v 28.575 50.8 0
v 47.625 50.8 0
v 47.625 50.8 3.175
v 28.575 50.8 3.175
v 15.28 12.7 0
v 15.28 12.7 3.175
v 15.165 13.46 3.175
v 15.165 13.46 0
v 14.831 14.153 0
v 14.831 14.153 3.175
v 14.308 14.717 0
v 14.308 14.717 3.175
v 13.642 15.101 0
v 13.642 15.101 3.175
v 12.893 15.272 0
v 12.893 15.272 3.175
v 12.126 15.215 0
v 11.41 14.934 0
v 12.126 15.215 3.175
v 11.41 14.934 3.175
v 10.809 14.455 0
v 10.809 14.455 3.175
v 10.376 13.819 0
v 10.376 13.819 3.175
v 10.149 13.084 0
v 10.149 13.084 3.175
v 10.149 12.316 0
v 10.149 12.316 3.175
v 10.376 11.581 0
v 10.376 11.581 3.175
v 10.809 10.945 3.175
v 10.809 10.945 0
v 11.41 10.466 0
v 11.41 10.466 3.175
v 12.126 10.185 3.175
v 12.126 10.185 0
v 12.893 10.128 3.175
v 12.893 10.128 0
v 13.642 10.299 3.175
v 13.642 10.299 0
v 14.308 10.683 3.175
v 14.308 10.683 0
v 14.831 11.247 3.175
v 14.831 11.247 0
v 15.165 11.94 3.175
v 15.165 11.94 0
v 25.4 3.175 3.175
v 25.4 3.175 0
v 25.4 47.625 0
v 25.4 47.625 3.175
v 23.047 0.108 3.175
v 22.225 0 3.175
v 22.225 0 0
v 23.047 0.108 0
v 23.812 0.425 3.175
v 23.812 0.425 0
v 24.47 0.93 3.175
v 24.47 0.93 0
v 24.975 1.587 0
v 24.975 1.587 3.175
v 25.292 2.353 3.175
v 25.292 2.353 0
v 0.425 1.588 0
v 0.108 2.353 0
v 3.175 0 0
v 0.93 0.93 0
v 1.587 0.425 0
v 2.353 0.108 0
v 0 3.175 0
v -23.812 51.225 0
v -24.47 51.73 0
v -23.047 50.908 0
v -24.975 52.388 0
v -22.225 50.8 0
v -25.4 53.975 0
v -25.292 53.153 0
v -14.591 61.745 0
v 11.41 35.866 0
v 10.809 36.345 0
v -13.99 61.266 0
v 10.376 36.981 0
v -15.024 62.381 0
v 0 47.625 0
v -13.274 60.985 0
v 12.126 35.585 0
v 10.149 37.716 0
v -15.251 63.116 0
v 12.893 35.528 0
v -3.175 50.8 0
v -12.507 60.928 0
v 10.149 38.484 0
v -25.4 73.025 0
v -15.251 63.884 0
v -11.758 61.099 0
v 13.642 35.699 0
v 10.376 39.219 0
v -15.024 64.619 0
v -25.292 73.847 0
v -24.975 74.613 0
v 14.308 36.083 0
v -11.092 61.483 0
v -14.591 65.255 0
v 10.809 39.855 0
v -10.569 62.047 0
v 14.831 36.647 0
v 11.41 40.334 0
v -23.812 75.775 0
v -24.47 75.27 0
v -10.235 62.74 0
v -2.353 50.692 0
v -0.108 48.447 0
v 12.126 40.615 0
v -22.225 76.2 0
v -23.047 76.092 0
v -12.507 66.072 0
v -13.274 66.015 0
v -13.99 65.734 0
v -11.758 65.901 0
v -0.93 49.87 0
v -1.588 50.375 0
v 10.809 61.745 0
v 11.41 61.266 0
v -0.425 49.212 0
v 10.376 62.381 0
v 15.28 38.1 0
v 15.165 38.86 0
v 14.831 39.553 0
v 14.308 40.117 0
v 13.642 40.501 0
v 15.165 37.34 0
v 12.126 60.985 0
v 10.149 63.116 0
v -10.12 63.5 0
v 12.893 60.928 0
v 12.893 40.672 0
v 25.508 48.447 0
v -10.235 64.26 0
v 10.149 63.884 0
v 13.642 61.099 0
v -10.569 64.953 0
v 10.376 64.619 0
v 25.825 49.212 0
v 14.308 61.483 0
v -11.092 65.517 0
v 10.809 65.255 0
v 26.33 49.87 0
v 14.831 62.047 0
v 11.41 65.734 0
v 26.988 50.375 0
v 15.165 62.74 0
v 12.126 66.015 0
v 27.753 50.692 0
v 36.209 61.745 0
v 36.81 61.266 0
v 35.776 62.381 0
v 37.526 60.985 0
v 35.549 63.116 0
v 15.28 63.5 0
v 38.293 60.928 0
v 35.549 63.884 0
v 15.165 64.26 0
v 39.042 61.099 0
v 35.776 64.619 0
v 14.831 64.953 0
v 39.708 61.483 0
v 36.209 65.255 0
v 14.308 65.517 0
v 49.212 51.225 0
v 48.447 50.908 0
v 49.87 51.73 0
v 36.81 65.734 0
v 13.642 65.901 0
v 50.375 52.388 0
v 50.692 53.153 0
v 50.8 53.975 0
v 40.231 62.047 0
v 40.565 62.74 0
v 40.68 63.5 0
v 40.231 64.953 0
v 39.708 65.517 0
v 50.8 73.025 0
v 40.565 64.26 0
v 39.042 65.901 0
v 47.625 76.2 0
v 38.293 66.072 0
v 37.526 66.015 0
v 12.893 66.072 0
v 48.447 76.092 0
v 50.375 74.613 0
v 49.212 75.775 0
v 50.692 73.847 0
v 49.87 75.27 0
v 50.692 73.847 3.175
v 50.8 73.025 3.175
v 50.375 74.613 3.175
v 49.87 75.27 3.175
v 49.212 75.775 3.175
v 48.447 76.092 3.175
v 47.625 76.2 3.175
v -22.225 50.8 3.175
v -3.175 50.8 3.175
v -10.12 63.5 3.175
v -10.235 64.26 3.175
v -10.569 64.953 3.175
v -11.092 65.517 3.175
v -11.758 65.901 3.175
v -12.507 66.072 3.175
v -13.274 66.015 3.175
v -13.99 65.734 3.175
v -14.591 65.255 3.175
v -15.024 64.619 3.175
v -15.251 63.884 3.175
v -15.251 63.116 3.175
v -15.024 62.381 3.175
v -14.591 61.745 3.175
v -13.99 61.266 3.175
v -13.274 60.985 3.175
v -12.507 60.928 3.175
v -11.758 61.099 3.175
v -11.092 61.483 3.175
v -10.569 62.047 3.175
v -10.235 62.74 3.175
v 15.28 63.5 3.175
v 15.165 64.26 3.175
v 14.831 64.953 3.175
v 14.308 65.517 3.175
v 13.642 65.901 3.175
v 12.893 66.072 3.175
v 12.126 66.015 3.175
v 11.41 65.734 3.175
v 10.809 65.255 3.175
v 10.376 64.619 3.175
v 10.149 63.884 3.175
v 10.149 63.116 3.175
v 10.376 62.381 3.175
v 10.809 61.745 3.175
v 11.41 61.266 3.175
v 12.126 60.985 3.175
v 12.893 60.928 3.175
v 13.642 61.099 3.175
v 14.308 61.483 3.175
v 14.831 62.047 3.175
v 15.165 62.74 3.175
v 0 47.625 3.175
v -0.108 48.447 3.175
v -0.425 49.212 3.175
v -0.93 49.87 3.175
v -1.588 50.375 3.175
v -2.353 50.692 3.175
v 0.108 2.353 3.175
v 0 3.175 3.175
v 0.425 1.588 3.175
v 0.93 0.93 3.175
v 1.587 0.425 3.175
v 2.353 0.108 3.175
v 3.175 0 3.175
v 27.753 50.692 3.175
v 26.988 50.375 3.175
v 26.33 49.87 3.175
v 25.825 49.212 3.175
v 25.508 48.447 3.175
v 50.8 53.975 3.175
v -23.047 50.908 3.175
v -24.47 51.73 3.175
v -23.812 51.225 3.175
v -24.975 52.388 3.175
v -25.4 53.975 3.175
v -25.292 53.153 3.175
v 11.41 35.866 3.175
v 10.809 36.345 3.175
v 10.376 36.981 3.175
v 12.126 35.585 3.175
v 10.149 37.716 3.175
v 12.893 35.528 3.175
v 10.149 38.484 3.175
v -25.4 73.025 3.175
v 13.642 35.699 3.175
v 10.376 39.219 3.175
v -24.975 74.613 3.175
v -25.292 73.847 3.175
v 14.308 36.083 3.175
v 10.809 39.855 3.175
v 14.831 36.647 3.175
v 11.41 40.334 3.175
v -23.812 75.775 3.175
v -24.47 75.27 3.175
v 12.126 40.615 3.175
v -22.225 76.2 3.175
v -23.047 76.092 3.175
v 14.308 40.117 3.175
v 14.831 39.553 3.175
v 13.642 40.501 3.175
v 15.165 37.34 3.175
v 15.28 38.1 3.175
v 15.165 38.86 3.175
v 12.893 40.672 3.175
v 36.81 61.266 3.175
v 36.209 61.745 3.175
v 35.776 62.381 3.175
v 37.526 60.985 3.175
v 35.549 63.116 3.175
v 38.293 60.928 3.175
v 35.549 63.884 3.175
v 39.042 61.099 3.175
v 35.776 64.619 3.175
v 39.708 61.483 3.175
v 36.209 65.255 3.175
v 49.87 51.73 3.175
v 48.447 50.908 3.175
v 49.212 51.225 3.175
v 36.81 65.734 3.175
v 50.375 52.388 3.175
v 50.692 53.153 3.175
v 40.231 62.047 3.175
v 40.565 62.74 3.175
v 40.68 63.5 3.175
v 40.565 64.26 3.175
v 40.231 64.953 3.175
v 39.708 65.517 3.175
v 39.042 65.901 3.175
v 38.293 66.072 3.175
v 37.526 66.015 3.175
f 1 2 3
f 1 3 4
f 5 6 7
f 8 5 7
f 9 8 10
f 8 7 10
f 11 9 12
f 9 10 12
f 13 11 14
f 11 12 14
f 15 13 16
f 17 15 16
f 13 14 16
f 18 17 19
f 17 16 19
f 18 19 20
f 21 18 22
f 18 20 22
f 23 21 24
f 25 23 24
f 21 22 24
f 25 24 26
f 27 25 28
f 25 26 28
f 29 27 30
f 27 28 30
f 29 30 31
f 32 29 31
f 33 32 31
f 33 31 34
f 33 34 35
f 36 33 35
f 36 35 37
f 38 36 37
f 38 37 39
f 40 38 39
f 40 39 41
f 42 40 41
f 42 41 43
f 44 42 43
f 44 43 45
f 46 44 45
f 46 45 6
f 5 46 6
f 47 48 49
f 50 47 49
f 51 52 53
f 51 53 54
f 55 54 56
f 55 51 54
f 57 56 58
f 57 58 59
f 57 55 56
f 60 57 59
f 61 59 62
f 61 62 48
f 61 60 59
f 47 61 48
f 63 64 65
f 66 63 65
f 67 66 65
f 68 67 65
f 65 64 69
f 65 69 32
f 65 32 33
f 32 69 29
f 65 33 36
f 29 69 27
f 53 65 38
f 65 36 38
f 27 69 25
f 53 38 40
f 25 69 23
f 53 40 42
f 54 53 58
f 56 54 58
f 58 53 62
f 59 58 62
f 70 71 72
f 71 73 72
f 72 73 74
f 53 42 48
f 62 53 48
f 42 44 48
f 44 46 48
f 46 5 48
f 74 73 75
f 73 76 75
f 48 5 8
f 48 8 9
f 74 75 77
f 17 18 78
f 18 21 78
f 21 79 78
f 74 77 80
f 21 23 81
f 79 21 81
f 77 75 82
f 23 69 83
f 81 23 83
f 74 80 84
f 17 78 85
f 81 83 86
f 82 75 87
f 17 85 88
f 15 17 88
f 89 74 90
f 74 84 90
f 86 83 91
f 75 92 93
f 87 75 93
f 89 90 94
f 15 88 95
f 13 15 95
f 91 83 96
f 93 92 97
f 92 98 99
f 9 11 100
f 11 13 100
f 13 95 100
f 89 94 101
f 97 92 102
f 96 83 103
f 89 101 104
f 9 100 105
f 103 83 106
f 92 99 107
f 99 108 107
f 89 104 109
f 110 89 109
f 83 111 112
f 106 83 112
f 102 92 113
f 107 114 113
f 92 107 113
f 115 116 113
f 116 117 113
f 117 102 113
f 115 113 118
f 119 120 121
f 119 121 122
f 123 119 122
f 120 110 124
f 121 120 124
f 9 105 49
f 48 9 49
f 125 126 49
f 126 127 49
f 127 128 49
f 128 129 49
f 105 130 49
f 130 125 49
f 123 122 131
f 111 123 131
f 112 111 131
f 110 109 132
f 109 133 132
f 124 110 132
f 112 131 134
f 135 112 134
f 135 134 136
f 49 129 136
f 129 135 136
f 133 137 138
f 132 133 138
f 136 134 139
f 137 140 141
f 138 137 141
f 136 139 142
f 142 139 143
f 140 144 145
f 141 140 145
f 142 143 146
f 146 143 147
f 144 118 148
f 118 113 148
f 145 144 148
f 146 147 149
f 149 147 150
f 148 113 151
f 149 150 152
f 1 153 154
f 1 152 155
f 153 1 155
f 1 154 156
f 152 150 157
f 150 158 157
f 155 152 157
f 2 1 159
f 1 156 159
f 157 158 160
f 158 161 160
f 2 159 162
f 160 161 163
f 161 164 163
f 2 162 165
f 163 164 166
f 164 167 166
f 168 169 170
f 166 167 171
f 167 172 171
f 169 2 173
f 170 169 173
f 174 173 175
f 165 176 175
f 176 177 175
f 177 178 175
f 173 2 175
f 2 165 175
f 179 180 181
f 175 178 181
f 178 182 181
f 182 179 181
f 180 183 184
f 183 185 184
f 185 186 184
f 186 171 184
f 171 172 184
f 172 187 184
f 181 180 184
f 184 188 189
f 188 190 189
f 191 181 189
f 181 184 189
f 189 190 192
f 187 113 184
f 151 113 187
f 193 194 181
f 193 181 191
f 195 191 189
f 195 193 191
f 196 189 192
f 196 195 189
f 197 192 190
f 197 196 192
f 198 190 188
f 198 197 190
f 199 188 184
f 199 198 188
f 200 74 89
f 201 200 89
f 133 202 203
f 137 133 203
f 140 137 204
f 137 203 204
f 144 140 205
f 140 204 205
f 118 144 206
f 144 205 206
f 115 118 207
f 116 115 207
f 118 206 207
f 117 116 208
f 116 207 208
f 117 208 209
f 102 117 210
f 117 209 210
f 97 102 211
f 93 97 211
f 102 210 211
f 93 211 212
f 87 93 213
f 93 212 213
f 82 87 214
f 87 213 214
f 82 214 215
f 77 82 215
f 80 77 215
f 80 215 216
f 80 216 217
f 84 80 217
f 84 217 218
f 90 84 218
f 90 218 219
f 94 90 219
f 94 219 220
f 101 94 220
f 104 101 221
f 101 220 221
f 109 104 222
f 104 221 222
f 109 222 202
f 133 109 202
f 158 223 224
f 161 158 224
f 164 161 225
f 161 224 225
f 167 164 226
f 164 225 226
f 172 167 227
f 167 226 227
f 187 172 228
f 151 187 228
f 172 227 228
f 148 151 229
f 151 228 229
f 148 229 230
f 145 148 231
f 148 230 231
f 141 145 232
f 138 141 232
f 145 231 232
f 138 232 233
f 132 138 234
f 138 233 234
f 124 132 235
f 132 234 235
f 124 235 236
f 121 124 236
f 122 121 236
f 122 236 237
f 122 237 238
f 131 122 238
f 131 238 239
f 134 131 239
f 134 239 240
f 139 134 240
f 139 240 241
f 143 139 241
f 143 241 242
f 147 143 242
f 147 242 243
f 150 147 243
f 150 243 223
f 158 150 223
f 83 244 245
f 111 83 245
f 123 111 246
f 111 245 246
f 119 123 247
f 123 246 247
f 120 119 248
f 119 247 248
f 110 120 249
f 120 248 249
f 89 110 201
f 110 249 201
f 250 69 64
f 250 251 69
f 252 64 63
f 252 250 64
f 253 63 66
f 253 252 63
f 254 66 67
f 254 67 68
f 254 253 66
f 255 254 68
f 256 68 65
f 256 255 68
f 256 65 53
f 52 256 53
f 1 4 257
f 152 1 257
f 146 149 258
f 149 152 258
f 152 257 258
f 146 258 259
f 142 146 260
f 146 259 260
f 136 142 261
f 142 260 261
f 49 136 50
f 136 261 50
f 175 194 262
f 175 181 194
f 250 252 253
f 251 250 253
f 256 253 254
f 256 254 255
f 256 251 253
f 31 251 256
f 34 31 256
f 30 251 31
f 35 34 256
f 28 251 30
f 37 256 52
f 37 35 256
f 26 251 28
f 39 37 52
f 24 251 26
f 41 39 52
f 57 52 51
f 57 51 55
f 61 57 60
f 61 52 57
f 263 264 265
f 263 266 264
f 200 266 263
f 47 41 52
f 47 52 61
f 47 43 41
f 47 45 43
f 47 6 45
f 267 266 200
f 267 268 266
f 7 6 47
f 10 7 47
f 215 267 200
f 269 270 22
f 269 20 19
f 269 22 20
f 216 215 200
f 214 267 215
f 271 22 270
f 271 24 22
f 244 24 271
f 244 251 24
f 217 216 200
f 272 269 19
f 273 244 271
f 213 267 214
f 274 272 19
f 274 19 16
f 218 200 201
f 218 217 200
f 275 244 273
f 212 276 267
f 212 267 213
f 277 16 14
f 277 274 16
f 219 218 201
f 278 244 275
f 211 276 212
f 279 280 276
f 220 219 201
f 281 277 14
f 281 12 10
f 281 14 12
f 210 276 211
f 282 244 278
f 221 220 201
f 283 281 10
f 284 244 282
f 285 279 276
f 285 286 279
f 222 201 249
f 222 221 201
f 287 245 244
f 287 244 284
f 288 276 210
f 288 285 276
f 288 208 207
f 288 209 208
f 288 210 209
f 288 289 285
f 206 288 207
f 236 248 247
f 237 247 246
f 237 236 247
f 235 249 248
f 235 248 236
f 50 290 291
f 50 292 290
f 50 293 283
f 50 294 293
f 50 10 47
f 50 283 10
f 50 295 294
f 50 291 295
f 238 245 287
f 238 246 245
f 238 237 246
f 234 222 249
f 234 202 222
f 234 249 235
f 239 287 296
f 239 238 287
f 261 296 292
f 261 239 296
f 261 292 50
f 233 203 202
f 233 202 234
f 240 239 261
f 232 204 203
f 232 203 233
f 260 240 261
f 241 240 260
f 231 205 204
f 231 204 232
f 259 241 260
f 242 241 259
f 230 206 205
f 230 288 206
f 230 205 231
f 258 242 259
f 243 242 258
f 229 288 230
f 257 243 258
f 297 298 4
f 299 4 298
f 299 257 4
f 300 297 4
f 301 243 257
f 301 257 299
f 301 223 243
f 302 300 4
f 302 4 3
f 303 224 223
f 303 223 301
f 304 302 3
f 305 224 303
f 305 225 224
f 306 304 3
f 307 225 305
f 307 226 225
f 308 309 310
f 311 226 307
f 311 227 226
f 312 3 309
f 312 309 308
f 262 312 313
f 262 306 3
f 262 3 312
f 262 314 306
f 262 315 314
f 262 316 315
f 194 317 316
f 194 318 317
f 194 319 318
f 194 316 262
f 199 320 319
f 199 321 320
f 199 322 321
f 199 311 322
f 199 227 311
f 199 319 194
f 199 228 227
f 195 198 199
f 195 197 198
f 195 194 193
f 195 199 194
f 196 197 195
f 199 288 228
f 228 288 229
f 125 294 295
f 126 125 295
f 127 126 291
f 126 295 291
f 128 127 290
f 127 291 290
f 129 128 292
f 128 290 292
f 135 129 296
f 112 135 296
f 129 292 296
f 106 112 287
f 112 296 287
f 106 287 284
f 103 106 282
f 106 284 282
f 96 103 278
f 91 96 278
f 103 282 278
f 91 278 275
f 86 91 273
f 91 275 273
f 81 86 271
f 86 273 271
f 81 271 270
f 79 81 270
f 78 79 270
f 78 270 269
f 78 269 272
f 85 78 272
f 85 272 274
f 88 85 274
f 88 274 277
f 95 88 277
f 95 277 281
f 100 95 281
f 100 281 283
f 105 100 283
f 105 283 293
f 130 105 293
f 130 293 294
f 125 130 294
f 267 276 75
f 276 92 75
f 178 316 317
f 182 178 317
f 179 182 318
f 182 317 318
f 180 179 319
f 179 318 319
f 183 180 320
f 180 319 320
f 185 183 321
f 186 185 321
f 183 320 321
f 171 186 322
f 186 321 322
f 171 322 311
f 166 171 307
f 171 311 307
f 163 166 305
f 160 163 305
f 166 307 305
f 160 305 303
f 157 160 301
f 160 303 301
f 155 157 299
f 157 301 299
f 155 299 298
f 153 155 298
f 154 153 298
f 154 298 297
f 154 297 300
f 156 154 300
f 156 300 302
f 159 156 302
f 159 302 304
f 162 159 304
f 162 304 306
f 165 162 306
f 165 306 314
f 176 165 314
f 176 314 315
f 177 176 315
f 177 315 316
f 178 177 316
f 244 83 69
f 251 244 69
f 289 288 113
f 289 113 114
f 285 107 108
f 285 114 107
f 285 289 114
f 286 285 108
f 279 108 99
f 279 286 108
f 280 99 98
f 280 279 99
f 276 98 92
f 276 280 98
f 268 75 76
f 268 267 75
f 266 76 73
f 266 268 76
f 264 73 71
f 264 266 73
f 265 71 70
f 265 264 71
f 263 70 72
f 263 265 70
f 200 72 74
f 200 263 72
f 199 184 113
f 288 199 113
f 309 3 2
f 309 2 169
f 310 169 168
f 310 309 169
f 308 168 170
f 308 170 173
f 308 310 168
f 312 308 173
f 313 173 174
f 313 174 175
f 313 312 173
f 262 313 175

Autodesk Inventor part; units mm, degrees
ref_plane "YZ Plane" through (0, 0, 0) normal (1, 0, 0) x (0, 1, 0)
ref_plane "XZ Plane" through (0, 0, 0) normal (0, 1, 0) x (-1, 0, 0)
ref_plane "XY Plane" through (0, 0, 0) normal (0, 0, 1) x (1, 0, 0)
sketch "Sketch1" plane through (0, 0, 0) normal (0, 0, 1) x (1, 0, 0)
  line L0 (0, 0) -> (25.4, 0)
  line L1 (25.4, 0) -> (25.4, 76.2)
  line L2 (25.4, 76.2) -> (0, 76.2)
  line L3 (0, 76.2) -> (0, 0)
  line L4 (25.4, 76.2) -> (50.8, 76.2)
  line L5 (50.8, 76.2) -> (50.8, 50.8)
  line L6 (50.8, 50.8) -> (25.4, 50.8)
  line L7 (25.4, 50.8) -> (25.4, 76.2)
  line L8 (0, 76.2) -> (-25.4, 76.2)
  line L9 (-25.4, 76.2) -> (-25.4, 50.8)
  line L10 (-25.4, 50.8) -> (0, 50.8)
  line L11 (0, 50.8) -> (0, 76.2)
  dimension "d0" = 25.4
  dimension "d1" = 76.2
  dimension "d2" = 25.4
  dimension "d3" = 25.4
  dimension "d4" = 25.4
  dimension "d5" = 25.4
extrude "Extrusion1" add sketch "Sketch1" along normal blind 3.175
sketch "Sketch2" plane through (0, 0, 3.175) normal (0, 0, 1) x (1, 0, 0)
  line L0 (-25.4, 76.2) -> (-25.4, 50.8) construction
  line L1 (-25.4, 63.5) -> (-12.7, 63.5) construction
  line L2 (-12.7, 63.5) -> (12.7, 63.5) construction
  line L3 (12.7, 63.5) -> (38.1, 63.5) construction
  line L4 (12.7, 63.5) -> (12.7, 38.1) construction
  line L5 (12.7, 38.1) -> (12.7, 12.7) construction
  circle A0 centre (-12.7, 63.5) radius 2.5797
  circle A1 centre (12.7, 63.5) radius 2.5797
  circle A2 centre (38.1, 63.5) radius 2.5797
  circle A3 centre (12.7, 38.1) radius 2.5797
  circle A4 centre (12.7, 12.7) radius 2.5797
  point P0 (0, 0)
  dimension "d8" = 12.7
  dimension "d9" = 25.4
  dimension "d10" = 25.4
  dimension "d11" = 25.4
  dimension "d12" = 25.4
  dimension "d13" = 5.1594
extrude "Extrusion2" cut sketch "Sketch2" against normal blind 3.175
fillet "Fillet1" radius 3.175 8 edges at (50.8, 76.2, 1.5875) (50.8, 50.8, 1.5875) (25.4, 50.8, 1.5875) (25.4, 0, 1.5875) (0, 0, 1.5875) (0, 50.8, 1.5875) (-25.4, 50.8, 1.5875) (-25.4, 76.2, 1.5875)
properties part number "0.125 T-Gusset"
